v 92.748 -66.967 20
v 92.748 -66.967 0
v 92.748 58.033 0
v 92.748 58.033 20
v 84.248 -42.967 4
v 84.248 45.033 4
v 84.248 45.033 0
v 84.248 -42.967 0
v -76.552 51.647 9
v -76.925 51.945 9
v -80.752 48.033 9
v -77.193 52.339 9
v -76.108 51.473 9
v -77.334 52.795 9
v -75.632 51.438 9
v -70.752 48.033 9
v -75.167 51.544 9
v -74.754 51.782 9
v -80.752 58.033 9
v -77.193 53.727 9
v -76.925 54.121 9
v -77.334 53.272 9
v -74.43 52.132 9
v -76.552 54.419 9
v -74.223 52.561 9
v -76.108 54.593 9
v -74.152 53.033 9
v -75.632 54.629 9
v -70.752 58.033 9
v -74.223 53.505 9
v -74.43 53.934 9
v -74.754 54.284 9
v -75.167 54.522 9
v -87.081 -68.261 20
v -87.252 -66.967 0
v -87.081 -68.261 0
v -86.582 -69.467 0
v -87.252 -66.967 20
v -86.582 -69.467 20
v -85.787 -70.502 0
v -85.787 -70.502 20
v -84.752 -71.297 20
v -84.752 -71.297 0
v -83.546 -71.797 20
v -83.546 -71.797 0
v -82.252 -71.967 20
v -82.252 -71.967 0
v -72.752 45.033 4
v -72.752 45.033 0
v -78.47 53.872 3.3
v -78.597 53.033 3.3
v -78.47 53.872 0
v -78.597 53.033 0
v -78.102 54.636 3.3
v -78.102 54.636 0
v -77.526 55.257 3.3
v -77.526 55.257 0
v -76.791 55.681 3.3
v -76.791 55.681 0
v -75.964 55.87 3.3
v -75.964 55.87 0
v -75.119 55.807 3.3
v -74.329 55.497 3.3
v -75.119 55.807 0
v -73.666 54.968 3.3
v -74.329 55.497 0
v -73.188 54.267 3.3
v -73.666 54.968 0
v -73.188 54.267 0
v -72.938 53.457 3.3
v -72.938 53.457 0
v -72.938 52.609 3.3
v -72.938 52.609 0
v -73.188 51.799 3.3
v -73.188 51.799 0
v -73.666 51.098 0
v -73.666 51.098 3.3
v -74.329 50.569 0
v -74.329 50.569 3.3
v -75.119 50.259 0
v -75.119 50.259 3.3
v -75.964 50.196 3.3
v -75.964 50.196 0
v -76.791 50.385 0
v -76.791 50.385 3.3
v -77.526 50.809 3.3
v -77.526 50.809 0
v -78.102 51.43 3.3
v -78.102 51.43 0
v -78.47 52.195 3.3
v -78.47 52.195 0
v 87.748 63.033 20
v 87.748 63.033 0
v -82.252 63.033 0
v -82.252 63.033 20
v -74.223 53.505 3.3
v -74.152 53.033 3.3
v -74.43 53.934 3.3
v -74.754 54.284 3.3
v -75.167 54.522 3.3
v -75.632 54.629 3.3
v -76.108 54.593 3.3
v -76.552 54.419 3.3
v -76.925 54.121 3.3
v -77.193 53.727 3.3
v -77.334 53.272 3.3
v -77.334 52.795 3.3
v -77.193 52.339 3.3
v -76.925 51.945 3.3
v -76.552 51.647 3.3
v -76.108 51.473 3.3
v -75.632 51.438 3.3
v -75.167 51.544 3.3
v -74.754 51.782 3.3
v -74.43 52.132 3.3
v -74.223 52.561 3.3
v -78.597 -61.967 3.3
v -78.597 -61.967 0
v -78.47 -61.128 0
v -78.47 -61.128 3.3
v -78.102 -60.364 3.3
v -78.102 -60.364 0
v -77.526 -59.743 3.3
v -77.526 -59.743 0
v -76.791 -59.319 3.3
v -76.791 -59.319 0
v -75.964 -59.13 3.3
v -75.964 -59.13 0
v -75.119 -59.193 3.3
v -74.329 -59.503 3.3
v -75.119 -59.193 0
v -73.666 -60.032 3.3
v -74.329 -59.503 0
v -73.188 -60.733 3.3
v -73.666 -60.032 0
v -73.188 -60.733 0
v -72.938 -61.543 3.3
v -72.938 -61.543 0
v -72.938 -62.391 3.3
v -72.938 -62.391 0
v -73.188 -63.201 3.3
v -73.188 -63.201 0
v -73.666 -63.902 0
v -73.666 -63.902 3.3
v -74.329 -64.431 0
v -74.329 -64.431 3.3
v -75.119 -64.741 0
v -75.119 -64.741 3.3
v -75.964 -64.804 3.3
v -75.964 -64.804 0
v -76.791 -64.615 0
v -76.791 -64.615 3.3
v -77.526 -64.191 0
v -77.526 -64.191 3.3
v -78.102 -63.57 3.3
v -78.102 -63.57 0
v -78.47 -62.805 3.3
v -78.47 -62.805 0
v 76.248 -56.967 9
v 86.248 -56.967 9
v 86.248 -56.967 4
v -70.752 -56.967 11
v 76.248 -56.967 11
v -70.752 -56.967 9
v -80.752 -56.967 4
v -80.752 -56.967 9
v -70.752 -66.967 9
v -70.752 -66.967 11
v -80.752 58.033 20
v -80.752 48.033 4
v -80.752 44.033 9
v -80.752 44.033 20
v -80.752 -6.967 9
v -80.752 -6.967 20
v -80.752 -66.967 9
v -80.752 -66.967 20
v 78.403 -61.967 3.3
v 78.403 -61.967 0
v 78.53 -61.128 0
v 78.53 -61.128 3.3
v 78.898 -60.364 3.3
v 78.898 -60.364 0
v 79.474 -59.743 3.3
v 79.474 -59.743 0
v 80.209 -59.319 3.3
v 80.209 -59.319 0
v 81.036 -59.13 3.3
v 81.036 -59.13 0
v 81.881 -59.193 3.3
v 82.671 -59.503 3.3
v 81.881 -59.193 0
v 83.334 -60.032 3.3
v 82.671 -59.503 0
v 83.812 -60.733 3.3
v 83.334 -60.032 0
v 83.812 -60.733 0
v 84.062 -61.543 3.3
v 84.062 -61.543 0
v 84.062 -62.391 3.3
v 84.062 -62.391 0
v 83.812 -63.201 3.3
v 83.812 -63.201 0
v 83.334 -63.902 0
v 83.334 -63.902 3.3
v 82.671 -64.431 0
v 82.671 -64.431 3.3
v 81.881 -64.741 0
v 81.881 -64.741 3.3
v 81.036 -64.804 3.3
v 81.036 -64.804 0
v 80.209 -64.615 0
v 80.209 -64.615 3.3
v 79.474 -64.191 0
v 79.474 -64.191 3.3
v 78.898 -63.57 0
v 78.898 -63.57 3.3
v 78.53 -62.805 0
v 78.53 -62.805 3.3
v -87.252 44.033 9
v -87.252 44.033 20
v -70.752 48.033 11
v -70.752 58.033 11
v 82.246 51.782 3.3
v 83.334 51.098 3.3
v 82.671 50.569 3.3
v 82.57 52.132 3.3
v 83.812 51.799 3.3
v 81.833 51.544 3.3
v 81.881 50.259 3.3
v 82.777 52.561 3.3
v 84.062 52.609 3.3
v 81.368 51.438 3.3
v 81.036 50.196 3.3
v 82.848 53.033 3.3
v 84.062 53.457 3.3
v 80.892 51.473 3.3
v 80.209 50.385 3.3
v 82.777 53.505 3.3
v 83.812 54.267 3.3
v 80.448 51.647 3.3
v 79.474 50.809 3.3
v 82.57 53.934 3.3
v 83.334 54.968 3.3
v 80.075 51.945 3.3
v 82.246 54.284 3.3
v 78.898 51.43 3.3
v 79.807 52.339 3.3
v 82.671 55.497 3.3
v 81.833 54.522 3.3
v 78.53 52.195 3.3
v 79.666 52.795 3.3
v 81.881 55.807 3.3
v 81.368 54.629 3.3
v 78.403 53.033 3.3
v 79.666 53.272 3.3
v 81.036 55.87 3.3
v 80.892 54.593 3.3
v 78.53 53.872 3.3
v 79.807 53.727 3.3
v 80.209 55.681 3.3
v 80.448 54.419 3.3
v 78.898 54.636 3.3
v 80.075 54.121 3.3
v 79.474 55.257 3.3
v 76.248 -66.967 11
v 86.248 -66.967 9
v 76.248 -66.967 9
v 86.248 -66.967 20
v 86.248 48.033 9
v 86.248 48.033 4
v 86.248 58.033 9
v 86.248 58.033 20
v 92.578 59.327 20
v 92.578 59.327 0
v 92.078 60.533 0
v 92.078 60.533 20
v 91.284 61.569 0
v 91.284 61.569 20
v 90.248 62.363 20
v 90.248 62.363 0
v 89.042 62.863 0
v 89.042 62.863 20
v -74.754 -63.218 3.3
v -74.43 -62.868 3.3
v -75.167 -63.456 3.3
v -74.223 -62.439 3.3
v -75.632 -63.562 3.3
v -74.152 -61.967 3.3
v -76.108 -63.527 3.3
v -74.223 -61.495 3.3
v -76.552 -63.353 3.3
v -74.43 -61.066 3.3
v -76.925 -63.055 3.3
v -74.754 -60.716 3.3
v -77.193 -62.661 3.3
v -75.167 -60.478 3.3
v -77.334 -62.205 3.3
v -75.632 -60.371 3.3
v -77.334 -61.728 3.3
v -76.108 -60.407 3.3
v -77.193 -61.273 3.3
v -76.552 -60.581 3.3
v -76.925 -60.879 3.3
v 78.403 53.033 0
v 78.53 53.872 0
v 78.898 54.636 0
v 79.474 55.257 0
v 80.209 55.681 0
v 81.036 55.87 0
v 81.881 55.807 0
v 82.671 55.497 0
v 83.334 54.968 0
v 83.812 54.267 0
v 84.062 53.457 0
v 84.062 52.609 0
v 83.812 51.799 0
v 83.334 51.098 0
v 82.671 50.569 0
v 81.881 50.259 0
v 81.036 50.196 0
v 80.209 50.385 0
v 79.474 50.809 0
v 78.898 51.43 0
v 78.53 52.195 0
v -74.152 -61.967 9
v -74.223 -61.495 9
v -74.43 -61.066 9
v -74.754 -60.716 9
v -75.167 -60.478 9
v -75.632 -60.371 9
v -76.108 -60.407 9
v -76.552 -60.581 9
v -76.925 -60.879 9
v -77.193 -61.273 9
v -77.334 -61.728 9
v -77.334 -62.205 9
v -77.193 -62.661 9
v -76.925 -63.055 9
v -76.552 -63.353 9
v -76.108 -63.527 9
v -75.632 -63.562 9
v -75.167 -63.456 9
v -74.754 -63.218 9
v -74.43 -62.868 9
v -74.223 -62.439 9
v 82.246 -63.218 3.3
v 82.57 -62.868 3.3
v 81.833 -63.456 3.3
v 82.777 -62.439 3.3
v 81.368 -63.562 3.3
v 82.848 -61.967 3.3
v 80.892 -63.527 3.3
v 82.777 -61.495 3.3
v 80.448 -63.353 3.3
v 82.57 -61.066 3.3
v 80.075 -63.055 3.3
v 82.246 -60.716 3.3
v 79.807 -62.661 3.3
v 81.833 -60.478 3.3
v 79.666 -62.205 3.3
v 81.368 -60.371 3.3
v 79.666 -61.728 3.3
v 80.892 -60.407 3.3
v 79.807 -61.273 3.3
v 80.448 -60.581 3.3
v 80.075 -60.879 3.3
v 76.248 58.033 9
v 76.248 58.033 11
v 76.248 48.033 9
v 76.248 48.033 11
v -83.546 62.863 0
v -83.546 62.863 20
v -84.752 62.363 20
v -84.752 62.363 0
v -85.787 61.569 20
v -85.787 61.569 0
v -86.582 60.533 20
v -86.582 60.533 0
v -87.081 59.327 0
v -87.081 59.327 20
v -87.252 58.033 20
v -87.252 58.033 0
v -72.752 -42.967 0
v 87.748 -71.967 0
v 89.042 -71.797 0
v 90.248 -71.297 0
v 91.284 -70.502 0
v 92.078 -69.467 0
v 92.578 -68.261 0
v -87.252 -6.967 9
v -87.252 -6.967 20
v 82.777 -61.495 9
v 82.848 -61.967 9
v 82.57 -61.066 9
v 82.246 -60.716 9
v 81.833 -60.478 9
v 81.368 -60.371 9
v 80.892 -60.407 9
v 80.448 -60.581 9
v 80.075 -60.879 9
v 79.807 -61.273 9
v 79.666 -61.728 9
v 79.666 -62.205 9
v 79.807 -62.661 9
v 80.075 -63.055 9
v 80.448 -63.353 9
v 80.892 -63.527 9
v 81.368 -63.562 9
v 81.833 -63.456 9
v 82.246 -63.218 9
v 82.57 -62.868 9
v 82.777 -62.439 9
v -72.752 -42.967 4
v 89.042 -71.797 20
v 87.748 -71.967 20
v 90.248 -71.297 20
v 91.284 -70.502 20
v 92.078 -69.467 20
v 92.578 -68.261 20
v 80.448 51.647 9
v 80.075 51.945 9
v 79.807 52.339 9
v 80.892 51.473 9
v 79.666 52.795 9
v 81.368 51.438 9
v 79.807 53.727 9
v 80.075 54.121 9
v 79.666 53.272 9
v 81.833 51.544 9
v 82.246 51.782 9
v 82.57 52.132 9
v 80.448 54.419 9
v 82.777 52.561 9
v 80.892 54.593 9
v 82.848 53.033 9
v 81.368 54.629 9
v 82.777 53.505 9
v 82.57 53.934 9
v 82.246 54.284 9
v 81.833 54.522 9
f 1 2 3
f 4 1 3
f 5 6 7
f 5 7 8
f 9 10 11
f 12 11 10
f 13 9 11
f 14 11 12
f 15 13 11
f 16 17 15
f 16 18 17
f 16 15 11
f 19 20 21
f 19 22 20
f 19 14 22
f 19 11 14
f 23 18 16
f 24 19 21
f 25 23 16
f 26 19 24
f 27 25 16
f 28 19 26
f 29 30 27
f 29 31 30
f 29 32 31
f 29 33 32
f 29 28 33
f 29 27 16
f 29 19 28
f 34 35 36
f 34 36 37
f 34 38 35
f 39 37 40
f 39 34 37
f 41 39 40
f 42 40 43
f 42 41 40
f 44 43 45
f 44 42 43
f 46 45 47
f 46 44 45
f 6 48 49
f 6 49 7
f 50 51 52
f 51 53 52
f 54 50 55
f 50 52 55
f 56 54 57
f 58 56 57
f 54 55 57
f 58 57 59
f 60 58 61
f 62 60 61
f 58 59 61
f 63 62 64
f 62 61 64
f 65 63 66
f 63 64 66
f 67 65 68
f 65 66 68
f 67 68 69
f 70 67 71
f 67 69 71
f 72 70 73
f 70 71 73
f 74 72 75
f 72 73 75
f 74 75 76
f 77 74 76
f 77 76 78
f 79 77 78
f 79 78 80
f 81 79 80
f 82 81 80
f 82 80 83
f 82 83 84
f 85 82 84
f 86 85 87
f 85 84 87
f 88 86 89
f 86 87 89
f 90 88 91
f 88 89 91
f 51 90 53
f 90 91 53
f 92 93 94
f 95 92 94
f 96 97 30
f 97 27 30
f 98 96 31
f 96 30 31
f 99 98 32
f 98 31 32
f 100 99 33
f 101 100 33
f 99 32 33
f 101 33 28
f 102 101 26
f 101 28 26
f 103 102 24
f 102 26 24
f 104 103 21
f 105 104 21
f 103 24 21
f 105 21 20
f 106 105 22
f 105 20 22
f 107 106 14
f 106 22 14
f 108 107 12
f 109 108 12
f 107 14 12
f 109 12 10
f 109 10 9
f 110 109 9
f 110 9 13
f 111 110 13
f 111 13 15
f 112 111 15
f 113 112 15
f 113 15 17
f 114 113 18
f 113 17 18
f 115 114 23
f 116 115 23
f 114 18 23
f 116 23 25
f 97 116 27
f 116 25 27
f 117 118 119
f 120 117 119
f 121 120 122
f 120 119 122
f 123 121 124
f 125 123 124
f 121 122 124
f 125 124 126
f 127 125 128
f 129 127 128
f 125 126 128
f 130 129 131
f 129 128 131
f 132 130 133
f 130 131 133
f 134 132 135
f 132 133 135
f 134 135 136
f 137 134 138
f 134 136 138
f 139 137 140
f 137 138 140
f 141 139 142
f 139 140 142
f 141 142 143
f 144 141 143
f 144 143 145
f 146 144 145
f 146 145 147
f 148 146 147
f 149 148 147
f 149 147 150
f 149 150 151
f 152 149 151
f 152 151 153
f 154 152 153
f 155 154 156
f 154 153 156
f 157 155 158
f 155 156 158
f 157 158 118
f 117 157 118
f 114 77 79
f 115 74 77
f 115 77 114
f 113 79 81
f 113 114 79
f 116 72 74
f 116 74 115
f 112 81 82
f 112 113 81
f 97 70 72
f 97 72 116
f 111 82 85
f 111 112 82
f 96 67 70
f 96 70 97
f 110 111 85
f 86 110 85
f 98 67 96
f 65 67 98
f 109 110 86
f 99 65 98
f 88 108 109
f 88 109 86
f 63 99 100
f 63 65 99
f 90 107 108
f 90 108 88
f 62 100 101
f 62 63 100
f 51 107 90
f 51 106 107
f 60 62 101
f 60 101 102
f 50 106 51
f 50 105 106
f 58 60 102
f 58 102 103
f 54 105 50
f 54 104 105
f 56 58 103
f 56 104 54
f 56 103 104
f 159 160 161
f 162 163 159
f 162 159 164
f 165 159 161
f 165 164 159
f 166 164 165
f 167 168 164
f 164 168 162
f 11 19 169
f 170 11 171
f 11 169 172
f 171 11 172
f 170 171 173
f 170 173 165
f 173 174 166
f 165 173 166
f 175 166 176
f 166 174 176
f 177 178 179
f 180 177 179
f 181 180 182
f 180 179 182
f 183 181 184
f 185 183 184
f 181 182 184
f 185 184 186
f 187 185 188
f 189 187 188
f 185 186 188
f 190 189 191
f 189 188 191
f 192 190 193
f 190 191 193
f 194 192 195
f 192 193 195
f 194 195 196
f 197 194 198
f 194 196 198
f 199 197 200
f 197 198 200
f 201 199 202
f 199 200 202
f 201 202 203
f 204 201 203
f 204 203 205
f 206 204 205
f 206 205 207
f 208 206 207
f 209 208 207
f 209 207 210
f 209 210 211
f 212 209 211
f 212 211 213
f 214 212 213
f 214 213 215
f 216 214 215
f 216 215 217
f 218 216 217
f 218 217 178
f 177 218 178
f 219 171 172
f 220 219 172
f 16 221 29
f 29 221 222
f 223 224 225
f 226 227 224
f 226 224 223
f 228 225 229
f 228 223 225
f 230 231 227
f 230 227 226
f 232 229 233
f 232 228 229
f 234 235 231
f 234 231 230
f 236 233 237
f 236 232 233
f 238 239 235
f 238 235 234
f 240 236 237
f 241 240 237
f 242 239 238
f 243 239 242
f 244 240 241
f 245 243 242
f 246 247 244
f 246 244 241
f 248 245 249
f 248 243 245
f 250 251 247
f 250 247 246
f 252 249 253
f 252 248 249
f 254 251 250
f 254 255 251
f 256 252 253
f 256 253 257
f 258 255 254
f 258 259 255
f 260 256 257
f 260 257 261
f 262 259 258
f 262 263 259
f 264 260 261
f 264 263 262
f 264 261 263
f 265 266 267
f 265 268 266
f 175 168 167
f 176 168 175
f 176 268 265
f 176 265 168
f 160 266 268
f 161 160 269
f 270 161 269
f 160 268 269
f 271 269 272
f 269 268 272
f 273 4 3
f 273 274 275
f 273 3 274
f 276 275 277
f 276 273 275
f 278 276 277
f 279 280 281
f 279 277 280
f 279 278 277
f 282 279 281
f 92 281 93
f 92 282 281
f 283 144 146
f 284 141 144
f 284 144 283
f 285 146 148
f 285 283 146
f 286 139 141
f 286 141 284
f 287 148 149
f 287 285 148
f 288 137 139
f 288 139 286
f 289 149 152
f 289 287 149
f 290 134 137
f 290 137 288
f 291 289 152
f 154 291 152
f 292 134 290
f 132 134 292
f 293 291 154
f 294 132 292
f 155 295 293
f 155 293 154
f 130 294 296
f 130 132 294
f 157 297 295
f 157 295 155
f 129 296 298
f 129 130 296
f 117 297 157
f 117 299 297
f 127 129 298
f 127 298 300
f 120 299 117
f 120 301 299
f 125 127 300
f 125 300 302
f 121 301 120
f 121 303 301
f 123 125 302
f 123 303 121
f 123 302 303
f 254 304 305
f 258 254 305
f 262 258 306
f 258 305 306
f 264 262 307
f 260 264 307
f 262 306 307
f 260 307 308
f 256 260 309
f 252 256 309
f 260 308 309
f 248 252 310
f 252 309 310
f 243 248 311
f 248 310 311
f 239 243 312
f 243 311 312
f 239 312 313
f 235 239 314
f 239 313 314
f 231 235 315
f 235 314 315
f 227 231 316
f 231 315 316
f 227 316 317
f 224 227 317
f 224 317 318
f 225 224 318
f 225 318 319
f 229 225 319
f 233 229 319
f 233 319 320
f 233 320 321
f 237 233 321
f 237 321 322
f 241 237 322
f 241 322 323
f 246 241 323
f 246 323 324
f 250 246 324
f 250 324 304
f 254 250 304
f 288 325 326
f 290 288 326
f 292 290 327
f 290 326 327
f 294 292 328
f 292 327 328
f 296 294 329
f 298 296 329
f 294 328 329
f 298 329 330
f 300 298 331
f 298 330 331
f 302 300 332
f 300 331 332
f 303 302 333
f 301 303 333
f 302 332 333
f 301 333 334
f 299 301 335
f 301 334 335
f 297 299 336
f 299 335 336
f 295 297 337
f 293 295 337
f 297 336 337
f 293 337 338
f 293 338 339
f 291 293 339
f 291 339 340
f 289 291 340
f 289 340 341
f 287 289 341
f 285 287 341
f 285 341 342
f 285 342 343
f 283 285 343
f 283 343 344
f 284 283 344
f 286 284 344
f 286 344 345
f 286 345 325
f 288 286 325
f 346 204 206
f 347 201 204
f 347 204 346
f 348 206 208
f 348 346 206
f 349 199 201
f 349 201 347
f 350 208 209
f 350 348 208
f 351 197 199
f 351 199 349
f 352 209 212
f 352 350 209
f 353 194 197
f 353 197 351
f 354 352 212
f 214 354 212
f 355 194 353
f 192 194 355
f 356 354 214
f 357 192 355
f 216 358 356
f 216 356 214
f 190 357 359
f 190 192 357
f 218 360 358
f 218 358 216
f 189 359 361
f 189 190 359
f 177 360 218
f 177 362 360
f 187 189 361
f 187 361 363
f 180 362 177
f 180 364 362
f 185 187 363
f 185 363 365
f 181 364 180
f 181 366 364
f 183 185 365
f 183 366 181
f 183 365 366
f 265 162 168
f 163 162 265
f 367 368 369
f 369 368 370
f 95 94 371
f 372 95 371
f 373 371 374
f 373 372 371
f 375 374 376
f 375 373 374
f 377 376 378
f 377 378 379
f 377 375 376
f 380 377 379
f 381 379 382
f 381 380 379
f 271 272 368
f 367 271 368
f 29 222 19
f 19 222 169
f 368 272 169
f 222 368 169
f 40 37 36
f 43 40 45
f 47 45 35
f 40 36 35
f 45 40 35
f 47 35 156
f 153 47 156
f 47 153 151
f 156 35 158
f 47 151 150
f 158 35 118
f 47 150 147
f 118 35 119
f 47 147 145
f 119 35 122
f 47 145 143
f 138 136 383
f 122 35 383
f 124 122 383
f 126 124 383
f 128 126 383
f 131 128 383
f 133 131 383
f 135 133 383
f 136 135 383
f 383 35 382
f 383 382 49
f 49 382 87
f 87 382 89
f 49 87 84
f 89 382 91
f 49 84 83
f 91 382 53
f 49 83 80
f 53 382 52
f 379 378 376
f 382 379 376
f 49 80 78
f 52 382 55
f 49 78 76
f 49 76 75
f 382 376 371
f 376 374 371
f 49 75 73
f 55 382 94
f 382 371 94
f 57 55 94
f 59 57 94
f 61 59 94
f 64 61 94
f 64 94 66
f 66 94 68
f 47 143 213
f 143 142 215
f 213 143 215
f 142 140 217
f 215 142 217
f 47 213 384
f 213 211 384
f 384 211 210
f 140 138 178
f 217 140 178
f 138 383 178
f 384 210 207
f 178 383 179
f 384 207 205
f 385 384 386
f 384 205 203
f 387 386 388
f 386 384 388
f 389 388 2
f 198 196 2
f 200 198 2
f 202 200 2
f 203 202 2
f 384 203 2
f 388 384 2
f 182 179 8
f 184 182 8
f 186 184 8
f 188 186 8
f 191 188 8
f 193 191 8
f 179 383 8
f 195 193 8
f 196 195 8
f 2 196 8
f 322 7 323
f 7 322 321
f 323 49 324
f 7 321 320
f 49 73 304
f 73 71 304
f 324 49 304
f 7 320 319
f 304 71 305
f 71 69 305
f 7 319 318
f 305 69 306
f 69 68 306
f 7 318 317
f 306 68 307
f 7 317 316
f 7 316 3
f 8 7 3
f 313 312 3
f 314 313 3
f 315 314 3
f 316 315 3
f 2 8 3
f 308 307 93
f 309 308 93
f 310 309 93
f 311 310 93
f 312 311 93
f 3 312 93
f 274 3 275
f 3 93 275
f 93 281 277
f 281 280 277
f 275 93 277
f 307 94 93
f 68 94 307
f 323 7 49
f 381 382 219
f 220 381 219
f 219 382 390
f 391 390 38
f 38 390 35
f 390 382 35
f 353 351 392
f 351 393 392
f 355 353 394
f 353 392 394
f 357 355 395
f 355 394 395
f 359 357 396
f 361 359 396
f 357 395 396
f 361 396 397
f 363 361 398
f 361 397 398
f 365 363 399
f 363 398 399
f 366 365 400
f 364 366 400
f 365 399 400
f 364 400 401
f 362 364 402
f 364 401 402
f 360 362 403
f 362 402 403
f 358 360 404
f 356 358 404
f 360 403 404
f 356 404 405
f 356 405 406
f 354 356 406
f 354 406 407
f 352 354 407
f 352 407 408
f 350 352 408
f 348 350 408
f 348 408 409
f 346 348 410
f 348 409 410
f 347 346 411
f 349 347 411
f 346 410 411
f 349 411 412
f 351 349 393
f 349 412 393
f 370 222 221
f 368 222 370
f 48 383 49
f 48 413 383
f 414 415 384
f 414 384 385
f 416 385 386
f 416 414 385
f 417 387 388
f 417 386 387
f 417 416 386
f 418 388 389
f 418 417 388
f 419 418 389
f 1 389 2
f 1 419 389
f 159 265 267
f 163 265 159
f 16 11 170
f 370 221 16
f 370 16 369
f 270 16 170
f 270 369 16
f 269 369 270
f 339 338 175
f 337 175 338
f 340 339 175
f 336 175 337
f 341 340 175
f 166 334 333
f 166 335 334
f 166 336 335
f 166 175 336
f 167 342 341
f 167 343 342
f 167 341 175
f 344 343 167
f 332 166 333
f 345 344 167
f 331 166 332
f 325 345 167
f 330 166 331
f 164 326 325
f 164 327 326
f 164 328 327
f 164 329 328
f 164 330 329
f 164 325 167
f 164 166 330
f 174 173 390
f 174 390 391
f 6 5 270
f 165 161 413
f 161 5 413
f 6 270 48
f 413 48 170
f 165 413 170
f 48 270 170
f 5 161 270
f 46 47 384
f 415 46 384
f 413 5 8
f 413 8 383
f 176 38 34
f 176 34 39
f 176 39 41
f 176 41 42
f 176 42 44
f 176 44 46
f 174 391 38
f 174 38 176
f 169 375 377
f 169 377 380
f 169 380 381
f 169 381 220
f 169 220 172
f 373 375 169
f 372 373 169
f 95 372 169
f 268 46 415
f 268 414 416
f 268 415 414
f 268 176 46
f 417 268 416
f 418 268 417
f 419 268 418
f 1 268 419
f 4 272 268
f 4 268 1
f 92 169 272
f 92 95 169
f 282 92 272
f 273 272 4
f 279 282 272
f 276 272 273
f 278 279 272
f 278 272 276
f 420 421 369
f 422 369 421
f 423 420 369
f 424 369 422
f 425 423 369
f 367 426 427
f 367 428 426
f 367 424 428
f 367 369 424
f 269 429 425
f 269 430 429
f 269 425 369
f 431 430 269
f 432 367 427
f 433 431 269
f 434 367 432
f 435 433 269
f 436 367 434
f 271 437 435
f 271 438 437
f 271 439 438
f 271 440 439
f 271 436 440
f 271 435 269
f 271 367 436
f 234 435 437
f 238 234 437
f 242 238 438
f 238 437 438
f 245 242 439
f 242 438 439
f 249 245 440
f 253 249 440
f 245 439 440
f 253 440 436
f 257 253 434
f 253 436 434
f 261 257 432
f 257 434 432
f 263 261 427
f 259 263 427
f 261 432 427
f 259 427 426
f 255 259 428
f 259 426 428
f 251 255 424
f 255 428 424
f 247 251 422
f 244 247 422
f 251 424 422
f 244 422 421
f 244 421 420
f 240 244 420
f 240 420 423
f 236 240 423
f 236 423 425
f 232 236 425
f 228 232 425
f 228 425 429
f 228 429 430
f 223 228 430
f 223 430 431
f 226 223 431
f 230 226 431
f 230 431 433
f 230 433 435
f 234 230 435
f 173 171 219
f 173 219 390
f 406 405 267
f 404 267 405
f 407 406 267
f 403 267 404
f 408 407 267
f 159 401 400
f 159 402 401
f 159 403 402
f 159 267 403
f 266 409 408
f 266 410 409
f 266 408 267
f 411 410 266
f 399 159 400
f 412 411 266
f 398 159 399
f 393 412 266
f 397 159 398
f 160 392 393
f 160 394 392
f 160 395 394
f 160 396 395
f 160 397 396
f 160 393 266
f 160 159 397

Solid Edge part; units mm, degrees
sketch "Sketch1" plane through (0, 0, 0) normal (0, 0, 1) x (1, 0, 0)
  line L0 (92.7483, 63.0331) -> (-87.2517, 63.0331)
  line L1 (-87.2517, 63.0331) -> (-87.2517, -71.9669)
  line L2 (-87.2517, -71.9669) -> (92.7483, -71.9669)
  line L3 (92.7483, -71.9669) -> (92.7483, 63.0331)
extrude "Protrusion1" add sketch "Sketch1" along normal blind 20
sketch "Sketch2" plane through (2.7483, -4.4669, 20) normal (0, 0, 1) x (1, 0, 0)
  line L0 (-83.5, 62.5) -> (-83.5, -62.5)
  line L1 (83.5, -62.5) -> (-83.5, -62.5)
  line L2 (83.5, -62.5) -> (83.5, 62.5)
  line L3 (83.5, 62.5) -> (-83.5, 62.5)
extrude "ExtrudedCutout_2" cut sketch "Sketch2" against normal blind 9
sketch "Sketch3" plane through (2.7483, -4.4669, 11) normal (0, 0, 1) x (1, 0, 0)
  line L0 (73.5, 52.5) -> (-73.5, 52.5)
  line L1 (-73.5, 52.5) -> (-73.5, 62.5)
  line L2 (-73.5, 62.5) -> (-83.5, 62.5)
  line L3 (-83.5, 62.5) -> (-83.5, -62.5)
  line L4 (-83.5, -62.5) -> (-73.5, -62.5)
  line L5 (-73.5, -62.5) -> (-73.5, -52.5)
  line L6 (-73.5, -52.5) -> (73.5, -52.5)
  line L7 (73.5, -62.5) -> (73.5, -52.5)
  line L8 (83.5, -62.5) -> (73.5, -62.5)
  line L9 (83.5, 62.5) -> (83.5, -62.5)
  line L10 (73.5, 62.5) -> (83.5, 62.5)
  line L11 (73.5, 62.5) -> (73.5, 52.5)
extrude "ExtrudedCutout_3" cut sketch "Sketch3" against normal blind 2
sketch "Sketch4" plane through (2.7483, -4.4669, 11) normal (0, 0, 1) x (1, 0, 0)
  circle A0 centre (-78.5, 57.5) radius 1.6
  circle A1 centre (-78.5, -57.5) radius 1.6
  circle A2 centre (78.5, 57.5) radius 1.6
  circle A3 centre (78.5, -57.5) radius 1.6
  dimension "D1" = 3.2
  dimension "D2" = 3.2
  dimension "D3" = 3.2
  dimension "D4" = 3.2
  dimension "D5" = 157
  dimension "D6" = 115
  dimension "D7" = 5
  dimension "D8" = 5
  dimension "D9" = 5
  dimension "D10" = 5
  dimension "D11" = 10
  dimension "D12" = 10
  dimension "D13" = 10
  dimension "D14" = 10
  dimension "D15" = 10
  dimension "D16" = 10
  dimension "D17" = 10
extrude "Cutout1" cut sketch "Sketch4" against normal up to next
sketch "Sketch5" plane through (2.7483, -4.4669, 9) normal (0, 0, 1) x (1, 0, 0)
  line L0 (-83.5, 52.5) -> (83.5, 52.5)
  line L1 (83.5, 52.5) -> (83.5, -52.5)
  line L2 (83.5, -52.5) -> (-83.5, -52.5)
  line L3 (-83.5, -52.5) -> (-83.5, 52.5)
extrude "ExtrudedCutout_6" cut sketch "Sketch5" against normal blind 5
sketch "Sketch6" plane through (2.7483, -4.4669, 9) normal (0, 0, 1) x (1, 0, 0)
  line L0 (-75.5, 49.5) -> (81.5, 49.5)
  line L1 (81.5, 49.5) -> (81.5, -38.5)
  line L2 (81.5, -38.5) -> (-75.5, -38.5)
  line L3 (-75.5, -38.5) -> (-75.5, 49.5)
extrude "Cutout2" cut sketch "Sketch6" against normal through all
sketch "Sketch7" plane through (-80.7517, -4.4669, 12) normal (1, 0, 0) x (0, -1, 0)
  line L0 (-48.5, 3) -> (2.5, 3)
  line L1 (2.5, 3) -> (2.5, -8)
  line L2 (2.5, -8) -> (-48.5, -8)
  line L3 (-48.5, 3) -> (-48.5, -8)
extrude "Cutout3" cut sketch "Sketch7" against normal through all
sketch "Sketch8" plane through (2.7483, -4.4669, 0) normal (0, 0, -1) x (-1, 0, 0)
  circle A0 centre (-78.5, 57.5) radius 2.845
  circle A1 centre (-78.5, -57.5) radius 2.845
  circle A2 centre (78.5, -57.5) radius 2.845
  circle A3 centre (78.5, 57.5) radius 2.845
  dimension "D1" = 5.69
  dimension "D2" = 5.69
  dimension "D3" = 5.69
  dimension "D4" = 5.69
extrude "ExtrudedCutout_10" cut sketch "Sketch8" against normal blind 3.3
fillet "Round_1" radius 5 4 edges at (-87.2517, -71.9669, 10) (92.7483, -71.9669, 10) (92.7483, 63.0331, 10) (-87.2517, 63.0331, 10)
